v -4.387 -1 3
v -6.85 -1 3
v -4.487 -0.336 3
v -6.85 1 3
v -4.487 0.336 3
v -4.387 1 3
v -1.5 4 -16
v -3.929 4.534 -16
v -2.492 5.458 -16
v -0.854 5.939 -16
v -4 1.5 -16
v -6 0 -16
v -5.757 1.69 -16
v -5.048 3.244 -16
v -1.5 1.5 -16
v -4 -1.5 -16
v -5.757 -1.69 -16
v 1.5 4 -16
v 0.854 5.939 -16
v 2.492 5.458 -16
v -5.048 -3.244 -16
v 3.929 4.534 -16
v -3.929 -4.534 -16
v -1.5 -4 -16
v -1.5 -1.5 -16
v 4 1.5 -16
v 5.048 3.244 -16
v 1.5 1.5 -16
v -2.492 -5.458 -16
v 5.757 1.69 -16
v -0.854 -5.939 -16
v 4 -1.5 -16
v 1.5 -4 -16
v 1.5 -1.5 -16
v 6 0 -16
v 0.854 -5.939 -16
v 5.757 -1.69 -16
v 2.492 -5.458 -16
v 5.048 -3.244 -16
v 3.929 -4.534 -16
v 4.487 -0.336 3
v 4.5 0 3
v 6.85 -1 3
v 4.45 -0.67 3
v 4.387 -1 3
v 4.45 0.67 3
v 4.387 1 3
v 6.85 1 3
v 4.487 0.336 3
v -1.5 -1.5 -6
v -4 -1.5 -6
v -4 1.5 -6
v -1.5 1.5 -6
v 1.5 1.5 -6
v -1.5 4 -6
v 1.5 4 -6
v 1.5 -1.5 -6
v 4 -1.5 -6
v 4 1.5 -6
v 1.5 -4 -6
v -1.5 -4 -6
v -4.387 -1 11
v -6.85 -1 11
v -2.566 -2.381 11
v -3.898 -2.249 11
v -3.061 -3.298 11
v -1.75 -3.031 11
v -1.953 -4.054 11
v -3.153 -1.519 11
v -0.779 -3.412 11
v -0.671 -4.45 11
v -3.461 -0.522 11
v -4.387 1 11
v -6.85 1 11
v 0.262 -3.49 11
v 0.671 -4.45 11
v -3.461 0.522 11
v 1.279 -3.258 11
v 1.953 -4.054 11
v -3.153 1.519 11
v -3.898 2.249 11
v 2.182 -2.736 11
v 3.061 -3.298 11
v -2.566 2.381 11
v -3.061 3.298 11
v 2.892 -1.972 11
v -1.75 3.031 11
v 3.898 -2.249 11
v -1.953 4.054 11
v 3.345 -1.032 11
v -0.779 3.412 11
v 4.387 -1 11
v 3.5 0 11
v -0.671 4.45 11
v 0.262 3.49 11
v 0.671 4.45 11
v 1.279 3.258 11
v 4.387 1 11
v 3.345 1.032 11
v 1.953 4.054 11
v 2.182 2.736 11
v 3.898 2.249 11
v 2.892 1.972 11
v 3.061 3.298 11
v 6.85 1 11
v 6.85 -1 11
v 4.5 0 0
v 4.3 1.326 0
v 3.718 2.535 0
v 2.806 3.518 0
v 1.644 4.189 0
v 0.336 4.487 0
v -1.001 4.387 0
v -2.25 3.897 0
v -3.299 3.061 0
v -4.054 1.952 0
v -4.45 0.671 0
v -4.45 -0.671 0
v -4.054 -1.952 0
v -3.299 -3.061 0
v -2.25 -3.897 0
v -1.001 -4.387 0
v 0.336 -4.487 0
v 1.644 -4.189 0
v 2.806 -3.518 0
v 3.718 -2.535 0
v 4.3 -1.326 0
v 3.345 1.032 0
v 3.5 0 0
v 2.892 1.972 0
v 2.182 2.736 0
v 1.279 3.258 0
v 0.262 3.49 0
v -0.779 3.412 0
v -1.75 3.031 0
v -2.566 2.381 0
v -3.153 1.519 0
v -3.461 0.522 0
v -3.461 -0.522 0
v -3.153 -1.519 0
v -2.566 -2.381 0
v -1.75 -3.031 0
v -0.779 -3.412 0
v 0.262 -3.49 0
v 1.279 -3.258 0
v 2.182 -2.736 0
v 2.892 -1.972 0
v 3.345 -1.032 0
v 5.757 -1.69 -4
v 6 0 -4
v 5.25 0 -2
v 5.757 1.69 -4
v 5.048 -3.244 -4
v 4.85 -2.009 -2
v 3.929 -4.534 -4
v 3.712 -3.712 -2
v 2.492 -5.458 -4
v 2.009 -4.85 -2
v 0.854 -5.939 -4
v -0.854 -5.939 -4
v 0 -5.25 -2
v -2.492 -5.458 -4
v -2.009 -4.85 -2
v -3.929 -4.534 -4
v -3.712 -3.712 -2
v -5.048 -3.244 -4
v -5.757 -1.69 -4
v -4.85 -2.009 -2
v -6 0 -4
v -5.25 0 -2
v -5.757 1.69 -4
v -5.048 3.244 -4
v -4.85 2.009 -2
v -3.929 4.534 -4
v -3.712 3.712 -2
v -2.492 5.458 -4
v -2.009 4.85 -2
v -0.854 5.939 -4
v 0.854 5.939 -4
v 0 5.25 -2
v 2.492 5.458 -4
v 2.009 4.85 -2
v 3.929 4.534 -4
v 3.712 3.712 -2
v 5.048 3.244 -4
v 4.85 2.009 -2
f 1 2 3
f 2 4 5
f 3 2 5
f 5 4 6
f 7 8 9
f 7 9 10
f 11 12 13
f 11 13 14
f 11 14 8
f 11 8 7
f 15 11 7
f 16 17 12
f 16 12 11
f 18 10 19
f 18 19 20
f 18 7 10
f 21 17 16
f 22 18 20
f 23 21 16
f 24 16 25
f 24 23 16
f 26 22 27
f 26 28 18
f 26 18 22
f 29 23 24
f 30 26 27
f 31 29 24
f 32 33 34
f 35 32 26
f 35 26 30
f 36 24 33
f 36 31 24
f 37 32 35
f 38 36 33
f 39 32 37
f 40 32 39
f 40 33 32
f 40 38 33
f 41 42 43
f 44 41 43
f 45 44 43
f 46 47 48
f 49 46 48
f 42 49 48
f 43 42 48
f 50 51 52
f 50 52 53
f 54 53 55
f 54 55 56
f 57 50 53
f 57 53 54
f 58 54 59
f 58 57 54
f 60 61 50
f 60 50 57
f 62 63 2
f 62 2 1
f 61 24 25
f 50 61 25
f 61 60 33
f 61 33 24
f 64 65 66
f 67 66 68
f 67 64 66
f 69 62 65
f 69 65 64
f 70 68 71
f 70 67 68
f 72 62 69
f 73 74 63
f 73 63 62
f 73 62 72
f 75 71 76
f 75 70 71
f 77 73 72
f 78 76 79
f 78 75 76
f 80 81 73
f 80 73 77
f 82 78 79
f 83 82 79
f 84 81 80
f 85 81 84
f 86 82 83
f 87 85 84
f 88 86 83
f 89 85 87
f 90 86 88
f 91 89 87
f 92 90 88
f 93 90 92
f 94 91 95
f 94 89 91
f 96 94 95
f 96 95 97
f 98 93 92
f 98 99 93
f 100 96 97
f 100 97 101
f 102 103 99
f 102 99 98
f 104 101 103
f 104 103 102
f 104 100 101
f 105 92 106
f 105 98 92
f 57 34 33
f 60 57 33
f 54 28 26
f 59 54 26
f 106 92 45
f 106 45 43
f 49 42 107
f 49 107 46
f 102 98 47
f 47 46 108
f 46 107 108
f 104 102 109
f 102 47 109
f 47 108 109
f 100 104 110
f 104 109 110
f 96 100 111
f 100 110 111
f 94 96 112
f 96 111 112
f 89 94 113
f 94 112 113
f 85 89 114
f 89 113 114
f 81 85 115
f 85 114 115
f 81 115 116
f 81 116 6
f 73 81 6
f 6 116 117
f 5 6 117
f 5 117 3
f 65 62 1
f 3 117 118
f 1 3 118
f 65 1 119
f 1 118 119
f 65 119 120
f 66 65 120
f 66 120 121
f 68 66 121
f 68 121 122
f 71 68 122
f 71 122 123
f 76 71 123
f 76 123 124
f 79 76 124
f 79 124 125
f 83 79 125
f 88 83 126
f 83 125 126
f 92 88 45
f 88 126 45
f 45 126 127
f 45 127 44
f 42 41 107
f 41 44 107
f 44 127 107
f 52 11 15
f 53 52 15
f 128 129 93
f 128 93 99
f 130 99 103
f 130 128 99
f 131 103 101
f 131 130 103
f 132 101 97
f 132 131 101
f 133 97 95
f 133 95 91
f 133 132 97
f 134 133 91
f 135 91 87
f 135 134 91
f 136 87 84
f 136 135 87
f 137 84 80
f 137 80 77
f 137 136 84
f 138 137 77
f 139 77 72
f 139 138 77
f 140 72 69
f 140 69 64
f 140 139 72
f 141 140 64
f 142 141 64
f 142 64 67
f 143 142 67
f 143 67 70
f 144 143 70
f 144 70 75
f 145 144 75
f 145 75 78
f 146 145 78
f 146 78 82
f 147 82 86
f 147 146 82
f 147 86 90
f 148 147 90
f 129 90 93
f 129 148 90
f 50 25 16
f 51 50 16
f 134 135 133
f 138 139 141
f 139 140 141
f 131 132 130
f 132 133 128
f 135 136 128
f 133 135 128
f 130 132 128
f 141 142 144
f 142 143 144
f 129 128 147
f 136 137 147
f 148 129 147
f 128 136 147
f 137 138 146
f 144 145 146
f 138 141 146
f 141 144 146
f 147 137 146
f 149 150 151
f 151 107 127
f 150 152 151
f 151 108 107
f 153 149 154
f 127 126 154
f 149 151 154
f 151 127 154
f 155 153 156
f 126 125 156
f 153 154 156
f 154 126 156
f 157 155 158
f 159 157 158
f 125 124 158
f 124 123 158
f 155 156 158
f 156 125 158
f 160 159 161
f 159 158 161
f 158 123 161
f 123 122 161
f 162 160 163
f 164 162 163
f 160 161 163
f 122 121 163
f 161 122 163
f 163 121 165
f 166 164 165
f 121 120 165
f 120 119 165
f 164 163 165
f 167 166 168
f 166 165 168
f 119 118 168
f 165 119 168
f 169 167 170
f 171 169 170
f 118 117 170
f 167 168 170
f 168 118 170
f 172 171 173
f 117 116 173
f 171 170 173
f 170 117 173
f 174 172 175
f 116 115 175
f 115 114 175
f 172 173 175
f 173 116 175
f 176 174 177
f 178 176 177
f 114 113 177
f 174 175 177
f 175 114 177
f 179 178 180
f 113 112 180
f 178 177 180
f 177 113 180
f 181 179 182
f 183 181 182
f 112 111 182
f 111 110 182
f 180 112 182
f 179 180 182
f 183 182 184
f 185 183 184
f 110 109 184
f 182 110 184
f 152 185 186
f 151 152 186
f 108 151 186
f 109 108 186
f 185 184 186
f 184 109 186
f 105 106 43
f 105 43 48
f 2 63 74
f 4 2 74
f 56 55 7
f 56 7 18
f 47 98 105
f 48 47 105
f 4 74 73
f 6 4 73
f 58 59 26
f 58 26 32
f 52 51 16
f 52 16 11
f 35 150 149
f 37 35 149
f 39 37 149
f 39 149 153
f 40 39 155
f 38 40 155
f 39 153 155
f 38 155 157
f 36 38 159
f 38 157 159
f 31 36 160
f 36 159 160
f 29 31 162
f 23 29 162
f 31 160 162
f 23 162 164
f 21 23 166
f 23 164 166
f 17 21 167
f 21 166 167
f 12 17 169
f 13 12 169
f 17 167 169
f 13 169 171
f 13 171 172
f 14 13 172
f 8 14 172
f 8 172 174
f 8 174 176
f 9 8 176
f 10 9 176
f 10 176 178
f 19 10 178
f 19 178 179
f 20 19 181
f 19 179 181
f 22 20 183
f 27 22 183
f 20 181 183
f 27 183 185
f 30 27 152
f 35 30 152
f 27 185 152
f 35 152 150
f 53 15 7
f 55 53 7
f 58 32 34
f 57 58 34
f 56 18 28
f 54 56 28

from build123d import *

# Parameters (mm, degrees)
F0_R     = 4.5
F0_R_2   = 3.5
F1_DEPTH = 11
F2_W     = 3.2331479252
F2_H     = 2
F3_DEPTH = 8
F4_R     = 6
F5_DEPTH = 16
F6_SIZE2 = 1.49999
F6_SIZE  = 3.99999
F8_DEPTH = 10


# Not quite as in the source:
# - a fillet or chamfer is up to 0.001 mm smaller than in the source, because OpenCascade refuses the exact size


with BuildPart() as f1:
    # F0 (on Top) → F1 (new body)
    with BuildSketch(Plane.XY):
        Circle(F0_R)
        Circle(F0_R_2, mode=Mode.SUBTRACT)
    extrude(amount=F1_DEPTH)

    # F2 (on face) → F3 (join)
    with BuildSketch(Plane.XY.offset(11)):
        with Locations((-5.2334260374, 0)):
            Rectangle(F2_W, F2_H)
        with Locations((5.2334260374, 0)):
            Rectangle(F2_W, F2_H)
    extrude(amount=-F3_DEPTH)

    # F4 (on face) → F5 (join)
    with BuildSketch(Plane(origin=(0, 0, 0), x_dir=(1, 0, 0), z_dir=(0, 0, -1))):
        Circle(F4_R)
    extrude(amount=F5_DEPTH)

    # F6 (size 4 and 1.5 in the source; OpenCascade refuses exactly that, so slightly less here)
    f6_edges = [f1.edges().sort_by_distance(p)[0] for p in [
        (-6, 0, 0),
    ]]
    f6_side = f1.faces().sort_by_distance((-6, 0, -8))[0]
    chamfer(f6_edges, length=F6_SIZE, length2=F6_SIZE2, reference=f6_side)

    # F7 (on face) → F8 (cut)
    with BuildSketch(Plane(origin=(0, 0, -16), x_dir=(1, 0, 0), z_dir=(0, 0, -1))):
        Polygon((-1.5, 1.5), (-4, 1.5), (-4, -1.5), (-1.5, -1.5), (-1.5, -4), (1.5, -4), (1.5, -1.5), (4, -1.5), (4, 1.5), (1.5, 1.5), (1.5, 4), (-1.5, 4), align=None)
    extrude(amount=-F8_DEPTH, mode=Mode.SUBTRACT)


solid = f1.part
